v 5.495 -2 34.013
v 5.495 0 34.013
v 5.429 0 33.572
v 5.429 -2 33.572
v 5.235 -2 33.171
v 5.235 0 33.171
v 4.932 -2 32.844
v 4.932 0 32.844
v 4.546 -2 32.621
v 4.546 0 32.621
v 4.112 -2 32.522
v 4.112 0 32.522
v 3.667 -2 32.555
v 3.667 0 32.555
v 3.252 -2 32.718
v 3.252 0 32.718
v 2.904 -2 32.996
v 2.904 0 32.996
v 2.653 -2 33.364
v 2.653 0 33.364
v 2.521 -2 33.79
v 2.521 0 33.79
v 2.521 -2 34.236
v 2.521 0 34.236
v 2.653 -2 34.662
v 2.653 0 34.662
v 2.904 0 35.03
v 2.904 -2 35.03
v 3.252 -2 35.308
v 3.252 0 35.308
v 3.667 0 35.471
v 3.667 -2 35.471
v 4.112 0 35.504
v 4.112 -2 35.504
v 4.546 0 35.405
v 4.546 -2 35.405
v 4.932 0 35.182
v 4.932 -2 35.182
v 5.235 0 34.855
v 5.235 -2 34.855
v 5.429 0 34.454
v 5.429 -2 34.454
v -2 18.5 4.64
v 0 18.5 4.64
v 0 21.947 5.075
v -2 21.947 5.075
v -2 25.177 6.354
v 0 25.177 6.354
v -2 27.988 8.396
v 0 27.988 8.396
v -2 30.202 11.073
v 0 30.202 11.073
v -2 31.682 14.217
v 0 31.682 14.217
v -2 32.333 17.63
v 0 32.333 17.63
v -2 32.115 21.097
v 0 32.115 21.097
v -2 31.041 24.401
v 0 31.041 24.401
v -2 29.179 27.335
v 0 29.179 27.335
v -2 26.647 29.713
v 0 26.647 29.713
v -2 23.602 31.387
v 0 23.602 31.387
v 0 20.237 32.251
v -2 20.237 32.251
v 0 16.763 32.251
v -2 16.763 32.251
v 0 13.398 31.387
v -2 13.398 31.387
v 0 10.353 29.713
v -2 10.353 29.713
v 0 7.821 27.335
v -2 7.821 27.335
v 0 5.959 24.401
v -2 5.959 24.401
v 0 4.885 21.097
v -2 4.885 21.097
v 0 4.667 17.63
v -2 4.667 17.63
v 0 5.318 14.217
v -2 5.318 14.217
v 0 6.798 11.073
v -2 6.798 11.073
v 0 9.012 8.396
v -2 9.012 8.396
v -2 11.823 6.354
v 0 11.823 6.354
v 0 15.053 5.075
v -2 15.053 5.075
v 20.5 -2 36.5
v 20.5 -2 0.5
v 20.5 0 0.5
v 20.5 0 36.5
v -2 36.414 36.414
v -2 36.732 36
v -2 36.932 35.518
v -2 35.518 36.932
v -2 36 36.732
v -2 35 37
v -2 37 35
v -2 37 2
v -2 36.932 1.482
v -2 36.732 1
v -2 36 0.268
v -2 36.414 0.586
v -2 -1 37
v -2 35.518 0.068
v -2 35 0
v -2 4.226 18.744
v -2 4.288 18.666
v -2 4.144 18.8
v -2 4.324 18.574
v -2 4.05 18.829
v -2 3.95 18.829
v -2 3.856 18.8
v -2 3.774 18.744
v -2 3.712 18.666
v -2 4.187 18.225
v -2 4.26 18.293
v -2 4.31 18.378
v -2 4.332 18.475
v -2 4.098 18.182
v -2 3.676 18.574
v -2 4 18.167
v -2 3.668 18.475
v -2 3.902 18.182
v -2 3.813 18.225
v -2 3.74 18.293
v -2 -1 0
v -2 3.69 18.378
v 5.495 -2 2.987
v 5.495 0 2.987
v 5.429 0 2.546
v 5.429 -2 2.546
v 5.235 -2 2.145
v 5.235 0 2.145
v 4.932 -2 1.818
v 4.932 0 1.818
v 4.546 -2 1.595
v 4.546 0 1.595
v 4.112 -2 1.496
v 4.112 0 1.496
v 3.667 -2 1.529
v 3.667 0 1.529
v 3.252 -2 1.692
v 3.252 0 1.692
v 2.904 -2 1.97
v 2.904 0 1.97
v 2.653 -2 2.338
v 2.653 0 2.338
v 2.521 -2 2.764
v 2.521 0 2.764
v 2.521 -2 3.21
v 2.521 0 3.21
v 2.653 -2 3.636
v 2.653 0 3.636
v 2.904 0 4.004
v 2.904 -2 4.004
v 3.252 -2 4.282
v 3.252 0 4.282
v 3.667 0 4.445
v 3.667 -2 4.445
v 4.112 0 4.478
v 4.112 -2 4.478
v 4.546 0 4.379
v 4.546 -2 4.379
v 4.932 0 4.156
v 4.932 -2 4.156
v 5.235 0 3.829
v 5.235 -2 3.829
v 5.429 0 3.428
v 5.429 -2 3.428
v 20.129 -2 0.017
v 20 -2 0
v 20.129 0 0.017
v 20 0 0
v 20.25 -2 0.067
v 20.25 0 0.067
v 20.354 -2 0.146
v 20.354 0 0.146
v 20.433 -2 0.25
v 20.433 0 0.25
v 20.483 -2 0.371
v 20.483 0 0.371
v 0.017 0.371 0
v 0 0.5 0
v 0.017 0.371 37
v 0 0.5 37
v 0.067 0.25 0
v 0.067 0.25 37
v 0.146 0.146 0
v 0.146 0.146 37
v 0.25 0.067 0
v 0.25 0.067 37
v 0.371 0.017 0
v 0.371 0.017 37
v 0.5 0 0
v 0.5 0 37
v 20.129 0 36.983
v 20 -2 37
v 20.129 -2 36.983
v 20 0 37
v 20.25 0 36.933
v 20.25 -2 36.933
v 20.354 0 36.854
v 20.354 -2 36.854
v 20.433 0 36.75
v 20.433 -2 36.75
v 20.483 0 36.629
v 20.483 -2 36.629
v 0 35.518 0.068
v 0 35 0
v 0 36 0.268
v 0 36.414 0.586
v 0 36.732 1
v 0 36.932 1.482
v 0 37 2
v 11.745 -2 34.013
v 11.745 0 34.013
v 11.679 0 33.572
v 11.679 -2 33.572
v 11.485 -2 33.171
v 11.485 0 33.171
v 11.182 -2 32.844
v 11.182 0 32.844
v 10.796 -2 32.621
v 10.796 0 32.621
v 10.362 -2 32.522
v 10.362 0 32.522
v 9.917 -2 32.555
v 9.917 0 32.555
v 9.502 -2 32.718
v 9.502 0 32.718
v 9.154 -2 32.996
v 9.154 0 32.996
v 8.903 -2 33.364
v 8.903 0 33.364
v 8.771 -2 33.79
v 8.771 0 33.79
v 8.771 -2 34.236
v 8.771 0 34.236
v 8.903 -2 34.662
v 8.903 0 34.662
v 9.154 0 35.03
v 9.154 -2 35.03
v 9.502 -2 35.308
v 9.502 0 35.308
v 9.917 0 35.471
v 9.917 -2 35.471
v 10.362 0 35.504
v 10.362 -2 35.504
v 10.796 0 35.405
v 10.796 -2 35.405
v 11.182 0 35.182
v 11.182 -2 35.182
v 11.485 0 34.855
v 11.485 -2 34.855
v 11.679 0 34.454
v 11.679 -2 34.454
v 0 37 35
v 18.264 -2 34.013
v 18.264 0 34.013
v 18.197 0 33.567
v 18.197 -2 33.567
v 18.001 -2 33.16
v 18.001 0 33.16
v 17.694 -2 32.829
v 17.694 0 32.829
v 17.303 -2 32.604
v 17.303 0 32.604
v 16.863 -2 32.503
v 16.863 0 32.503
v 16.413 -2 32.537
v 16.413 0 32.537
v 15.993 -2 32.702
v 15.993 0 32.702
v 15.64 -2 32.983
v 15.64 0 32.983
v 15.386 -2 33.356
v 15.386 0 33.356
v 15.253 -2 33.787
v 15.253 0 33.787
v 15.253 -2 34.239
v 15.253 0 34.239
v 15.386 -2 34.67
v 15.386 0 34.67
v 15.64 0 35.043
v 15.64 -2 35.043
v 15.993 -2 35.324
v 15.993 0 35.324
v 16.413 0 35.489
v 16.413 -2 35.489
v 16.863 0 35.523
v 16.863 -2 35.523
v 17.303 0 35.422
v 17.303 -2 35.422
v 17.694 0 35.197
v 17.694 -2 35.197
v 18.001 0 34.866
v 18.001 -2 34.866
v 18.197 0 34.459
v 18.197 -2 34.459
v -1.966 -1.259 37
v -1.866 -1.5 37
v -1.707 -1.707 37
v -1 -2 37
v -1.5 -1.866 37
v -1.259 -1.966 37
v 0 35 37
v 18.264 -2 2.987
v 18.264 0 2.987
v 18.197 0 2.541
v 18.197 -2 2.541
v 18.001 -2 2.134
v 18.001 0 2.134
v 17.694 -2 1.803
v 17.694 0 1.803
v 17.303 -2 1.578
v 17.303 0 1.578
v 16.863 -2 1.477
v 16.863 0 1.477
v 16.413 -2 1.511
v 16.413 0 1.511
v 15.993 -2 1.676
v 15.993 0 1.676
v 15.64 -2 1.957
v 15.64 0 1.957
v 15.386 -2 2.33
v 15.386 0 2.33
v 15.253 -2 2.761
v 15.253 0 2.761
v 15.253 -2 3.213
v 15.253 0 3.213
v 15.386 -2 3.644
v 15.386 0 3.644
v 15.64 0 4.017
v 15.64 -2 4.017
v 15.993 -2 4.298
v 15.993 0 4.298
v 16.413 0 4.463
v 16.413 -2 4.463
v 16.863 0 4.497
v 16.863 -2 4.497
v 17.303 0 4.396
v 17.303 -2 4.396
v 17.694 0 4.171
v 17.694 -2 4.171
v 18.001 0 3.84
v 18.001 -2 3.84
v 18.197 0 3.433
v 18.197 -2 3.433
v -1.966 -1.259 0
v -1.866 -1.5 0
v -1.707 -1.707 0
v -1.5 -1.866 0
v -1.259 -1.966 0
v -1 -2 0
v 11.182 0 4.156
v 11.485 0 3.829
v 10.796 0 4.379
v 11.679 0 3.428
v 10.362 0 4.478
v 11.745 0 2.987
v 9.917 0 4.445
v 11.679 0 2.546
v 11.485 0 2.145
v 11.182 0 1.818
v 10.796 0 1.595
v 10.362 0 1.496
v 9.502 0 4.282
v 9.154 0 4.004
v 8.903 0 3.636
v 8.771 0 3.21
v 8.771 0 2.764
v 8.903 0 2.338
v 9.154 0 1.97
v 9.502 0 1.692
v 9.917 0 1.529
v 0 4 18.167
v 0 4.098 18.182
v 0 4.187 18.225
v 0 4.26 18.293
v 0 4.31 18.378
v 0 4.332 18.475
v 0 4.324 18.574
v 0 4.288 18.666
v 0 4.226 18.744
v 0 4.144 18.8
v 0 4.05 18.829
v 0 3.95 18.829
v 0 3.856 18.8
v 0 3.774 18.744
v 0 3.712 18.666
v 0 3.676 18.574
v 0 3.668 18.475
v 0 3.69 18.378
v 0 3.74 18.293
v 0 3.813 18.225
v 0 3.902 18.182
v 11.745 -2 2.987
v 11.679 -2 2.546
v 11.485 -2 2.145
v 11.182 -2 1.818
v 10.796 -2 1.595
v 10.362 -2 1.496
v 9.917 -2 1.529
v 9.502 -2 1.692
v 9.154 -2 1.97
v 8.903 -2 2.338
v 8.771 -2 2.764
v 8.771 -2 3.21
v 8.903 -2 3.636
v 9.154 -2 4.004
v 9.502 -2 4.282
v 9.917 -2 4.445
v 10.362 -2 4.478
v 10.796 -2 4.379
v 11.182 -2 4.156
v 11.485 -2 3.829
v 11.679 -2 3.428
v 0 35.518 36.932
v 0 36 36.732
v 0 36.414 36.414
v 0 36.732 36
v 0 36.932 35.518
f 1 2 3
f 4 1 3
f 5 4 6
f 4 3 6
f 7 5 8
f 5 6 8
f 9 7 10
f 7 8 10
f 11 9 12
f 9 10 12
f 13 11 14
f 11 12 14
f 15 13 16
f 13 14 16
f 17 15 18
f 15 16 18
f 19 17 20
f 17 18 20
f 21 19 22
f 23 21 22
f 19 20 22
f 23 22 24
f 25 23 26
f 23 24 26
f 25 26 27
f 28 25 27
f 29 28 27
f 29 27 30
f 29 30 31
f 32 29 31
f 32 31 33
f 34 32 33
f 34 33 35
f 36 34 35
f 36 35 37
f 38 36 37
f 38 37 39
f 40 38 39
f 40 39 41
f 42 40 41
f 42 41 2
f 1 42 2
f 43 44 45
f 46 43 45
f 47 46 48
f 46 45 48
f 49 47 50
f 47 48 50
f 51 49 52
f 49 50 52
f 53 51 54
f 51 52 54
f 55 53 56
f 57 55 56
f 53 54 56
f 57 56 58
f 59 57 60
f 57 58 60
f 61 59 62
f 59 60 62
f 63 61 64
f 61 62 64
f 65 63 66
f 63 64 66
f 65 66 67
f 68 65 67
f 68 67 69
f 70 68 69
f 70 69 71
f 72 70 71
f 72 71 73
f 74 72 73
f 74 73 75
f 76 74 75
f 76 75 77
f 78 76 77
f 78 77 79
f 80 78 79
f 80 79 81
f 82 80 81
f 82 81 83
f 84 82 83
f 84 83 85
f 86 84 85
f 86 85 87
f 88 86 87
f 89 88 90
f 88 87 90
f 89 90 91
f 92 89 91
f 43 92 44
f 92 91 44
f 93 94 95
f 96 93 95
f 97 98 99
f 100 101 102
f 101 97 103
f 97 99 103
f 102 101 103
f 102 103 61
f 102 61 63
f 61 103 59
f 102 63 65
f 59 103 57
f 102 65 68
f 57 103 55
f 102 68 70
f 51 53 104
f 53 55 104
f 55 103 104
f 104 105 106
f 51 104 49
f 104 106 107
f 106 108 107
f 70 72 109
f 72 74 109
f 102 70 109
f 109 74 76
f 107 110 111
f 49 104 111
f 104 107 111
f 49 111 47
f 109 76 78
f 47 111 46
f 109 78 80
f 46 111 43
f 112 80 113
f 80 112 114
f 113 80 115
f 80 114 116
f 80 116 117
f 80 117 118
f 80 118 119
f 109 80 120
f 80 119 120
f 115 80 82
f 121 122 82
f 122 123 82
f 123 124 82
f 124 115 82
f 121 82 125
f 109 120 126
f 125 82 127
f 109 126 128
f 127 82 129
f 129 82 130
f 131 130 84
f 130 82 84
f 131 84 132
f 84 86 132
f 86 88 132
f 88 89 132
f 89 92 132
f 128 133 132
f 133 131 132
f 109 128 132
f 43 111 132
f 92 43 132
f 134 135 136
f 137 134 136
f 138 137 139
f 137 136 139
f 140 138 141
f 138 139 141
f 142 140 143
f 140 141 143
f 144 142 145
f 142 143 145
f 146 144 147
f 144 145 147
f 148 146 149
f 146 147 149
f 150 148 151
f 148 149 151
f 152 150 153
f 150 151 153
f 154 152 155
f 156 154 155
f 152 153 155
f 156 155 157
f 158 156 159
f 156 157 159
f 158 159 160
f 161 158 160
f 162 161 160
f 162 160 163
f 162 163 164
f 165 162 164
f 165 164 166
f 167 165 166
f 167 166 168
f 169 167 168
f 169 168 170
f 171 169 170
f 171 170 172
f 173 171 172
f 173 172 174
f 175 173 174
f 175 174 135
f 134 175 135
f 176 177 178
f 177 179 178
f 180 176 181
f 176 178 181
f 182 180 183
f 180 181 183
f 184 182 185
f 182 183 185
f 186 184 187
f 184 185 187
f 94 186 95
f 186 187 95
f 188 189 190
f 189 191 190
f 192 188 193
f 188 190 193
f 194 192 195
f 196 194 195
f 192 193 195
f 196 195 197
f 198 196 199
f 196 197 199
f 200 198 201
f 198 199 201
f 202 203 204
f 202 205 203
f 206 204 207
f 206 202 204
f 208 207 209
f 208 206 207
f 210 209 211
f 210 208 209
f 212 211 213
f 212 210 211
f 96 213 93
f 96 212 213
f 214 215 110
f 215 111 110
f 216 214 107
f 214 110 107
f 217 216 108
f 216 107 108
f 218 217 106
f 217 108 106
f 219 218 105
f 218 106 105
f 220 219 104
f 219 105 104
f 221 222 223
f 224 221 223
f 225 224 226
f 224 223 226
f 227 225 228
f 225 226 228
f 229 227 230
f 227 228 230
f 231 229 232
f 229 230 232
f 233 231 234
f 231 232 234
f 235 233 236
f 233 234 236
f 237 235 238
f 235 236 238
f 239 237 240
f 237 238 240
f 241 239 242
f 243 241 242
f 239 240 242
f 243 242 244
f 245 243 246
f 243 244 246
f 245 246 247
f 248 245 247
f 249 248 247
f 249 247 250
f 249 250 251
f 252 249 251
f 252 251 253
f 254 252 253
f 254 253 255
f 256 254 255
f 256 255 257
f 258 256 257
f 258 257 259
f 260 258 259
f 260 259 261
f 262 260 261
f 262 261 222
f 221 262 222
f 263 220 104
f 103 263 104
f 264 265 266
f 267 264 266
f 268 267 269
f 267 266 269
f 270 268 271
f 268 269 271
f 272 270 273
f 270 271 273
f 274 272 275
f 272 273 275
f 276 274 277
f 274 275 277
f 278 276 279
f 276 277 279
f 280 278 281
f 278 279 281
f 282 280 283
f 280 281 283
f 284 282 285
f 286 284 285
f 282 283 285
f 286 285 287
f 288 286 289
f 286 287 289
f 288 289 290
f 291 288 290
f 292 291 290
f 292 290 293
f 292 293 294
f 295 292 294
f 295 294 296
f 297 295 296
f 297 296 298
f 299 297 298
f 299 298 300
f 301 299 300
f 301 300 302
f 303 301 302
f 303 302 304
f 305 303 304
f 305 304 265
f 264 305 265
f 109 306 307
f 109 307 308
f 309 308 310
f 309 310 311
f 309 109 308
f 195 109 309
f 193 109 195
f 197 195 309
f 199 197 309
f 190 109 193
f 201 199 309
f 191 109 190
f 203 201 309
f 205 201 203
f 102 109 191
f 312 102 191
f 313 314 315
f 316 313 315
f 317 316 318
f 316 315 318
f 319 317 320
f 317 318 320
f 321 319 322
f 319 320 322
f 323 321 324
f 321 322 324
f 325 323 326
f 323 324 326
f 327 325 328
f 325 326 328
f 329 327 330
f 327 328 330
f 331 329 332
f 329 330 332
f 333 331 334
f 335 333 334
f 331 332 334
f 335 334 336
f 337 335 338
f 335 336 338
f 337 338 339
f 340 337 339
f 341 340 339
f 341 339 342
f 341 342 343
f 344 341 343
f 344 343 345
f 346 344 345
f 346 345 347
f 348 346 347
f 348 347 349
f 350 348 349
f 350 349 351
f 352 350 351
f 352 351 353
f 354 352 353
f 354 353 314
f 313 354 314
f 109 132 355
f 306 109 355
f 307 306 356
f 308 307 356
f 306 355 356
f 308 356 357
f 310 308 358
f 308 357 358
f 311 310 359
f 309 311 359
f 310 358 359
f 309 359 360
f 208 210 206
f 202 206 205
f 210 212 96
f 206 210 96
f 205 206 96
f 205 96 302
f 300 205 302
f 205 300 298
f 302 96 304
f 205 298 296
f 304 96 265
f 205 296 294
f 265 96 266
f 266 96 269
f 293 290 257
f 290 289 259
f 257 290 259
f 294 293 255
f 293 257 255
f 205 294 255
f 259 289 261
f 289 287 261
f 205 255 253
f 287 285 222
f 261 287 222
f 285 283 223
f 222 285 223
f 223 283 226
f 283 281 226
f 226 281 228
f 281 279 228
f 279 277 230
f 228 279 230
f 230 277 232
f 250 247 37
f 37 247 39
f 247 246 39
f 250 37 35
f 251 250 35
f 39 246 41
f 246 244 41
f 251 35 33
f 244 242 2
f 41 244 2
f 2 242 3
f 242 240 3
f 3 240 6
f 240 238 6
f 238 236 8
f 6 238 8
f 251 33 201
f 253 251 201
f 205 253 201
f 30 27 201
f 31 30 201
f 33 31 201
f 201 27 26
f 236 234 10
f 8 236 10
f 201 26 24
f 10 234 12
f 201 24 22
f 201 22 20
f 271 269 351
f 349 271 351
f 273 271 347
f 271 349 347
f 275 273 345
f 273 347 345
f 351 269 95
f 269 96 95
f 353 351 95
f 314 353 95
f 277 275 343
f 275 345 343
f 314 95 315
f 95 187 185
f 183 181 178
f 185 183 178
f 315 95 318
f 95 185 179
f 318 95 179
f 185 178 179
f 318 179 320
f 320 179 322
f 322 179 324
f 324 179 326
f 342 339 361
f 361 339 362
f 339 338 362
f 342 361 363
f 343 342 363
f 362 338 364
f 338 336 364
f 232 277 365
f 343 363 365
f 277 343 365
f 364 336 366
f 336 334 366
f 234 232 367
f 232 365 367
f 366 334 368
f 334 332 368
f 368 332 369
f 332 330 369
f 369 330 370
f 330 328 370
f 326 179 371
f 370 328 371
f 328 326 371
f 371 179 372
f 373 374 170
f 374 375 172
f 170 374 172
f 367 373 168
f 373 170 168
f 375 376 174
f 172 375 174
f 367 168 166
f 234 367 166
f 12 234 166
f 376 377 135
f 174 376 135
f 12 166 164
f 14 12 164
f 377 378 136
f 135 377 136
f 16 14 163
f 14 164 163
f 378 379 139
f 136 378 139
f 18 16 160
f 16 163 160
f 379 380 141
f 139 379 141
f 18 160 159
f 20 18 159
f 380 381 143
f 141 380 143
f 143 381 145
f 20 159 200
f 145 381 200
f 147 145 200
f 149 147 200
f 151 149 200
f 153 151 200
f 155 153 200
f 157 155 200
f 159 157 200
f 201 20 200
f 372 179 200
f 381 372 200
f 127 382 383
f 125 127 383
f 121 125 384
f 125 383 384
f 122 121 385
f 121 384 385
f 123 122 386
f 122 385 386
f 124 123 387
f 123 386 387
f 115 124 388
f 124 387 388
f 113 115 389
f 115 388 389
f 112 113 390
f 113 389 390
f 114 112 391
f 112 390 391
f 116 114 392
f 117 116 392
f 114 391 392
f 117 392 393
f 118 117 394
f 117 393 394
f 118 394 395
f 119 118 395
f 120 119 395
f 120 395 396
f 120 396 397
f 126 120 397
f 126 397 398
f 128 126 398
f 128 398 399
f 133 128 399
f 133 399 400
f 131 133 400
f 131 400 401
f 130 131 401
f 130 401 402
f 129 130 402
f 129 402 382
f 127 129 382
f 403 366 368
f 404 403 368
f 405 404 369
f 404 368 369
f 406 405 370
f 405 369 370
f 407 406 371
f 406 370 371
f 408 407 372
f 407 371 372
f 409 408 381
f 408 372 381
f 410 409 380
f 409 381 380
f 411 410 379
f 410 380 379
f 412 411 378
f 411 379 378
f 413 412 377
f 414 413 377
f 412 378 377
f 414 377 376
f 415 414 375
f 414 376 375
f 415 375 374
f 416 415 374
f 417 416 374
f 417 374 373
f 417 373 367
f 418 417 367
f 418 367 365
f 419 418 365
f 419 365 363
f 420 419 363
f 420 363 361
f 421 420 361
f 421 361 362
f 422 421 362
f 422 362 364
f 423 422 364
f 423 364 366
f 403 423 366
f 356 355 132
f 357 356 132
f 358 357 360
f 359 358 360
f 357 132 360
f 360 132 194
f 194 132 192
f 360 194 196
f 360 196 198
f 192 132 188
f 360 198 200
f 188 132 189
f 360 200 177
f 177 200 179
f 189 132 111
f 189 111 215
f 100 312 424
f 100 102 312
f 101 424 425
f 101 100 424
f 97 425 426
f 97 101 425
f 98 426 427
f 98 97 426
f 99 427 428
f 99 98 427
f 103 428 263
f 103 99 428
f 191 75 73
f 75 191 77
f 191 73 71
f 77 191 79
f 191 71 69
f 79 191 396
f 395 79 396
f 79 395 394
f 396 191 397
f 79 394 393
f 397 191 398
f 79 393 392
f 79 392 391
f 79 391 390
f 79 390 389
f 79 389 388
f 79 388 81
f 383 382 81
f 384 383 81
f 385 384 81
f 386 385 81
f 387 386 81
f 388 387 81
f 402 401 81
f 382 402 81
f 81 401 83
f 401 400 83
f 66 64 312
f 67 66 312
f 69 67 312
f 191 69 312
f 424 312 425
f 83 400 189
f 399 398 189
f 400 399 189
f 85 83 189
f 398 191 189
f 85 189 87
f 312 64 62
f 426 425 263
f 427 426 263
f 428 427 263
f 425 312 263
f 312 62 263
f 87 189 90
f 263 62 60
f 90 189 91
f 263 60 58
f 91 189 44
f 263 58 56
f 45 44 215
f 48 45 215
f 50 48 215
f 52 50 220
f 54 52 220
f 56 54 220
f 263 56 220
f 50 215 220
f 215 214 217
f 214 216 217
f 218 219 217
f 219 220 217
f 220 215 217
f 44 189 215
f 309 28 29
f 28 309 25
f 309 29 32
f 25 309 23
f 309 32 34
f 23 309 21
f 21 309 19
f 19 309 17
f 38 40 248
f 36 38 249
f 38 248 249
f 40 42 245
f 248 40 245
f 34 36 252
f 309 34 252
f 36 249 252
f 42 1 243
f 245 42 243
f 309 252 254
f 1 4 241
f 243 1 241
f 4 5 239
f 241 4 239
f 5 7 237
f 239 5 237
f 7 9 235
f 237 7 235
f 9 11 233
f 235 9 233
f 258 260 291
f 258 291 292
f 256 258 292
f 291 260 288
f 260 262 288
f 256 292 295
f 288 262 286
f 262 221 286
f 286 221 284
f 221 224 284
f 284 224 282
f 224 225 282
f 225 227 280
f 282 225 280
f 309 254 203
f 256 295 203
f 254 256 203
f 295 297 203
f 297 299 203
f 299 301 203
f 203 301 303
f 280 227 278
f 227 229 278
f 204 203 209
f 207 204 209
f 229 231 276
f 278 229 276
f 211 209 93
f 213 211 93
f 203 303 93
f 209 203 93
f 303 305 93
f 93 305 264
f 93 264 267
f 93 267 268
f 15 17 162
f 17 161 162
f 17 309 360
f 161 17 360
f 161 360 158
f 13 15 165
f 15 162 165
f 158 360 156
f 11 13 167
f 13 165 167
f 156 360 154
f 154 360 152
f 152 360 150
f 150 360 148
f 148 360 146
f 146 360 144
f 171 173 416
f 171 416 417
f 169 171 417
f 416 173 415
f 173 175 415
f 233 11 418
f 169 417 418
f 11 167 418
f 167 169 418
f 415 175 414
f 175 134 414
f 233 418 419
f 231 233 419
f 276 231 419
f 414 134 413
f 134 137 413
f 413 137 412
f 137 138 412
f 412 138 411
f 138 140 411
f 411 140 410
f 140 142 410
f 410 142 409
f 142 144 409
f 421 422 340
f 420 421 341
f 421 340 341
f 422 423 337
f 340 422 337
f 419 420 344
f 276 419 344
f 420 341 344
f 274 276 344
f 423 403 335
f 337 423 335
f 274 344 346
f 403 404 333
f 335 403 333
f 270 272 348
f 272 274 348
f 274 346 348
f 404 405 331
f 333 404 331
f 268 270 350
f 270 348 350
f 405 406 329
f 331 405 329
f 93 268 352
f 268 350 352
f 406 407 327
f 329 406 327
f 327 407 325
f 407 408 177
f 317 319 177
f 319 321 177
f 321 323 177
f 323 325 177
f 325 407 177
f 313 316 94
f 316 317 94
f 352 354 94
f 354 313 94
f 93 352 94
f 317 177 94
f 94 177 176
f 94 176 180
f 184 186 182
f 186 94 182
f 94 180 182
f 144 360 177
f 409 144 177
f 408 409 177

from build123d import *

# Parameters (mm, degrees)
BOSS_EXTRUDE1_DEPTH = 37
SKETCH2_R           = 13.860055969
SKETCH2_R_2         = 0.332739378
CUT_EXTRUDE1_DEPTH  = 10
SKETCH3_R           = 1.513801081
SKETCH3_R_2         = 1.495226131
CUT_EXTRUDE2_DEPTH  = 10
FILLET1_R           = 2
FILLET2_R           = 0.5
FILLET3_R           = 0.5


with BuildPart() as part:
    # Sketch1 → Boss-Extrude1 (new body)
    with BuildSketch(Plane.XY):
        with BuildLine():
            Line((0, 0), (0, 37))
            Line((0, 37), (-2, 37))
            Line((-2, 37), (-2, -1))
            ThreePointArc((-2, -1), (-1.707106781, -1.707106781), (-1, -2))
            Line((-1, -2), (20.5, -2))
            Line((20.5, -2), (20.5, 0))
            Line((20.5, 0), (0, 0))
        make_face()
    extrude(amount=BOSS_EXTRUDE1_DEPTH)

    # Sketch2 → Cut-Extrude1 (cut)
    with BuildSketch(Plane(origin=(0, 0, 0), x_dir=(0, 0, -1), z_dir=(1, 0, 0))):
        with Locations((-18.5, 18.5)):
            Circle(SKETCH2_R)
        with Locations((-18.5, 4)):
            Circle(SKETCH2_R_2)
    extrude(amount=-CUT_EXTRUDE1_DEPTH, mode=Mode.SUBTRACT)

    # Sketch3 → Cut-Extrude2 (cut)
    with BuildSketch(Plane(origin=(0, 0, 0), x_dir=(1, 0, 0), z_dir=(0, 1, 0))):
        with Locations((16.75, -2.987028894)):
            Circle(SKETCH3_R)
        with Locations((10.25, -2.987028894)):
            Circle(SKETCH3_R_2)
        with Locations((4, -2.987028894)):
            Circle(SKETCH3_R_2)
        with Locations((16.75, -34.012971106)):
            Circle(SKETCH3_R)
        with Locations((10.25, -34.012971106)):
            Circle(SKETCH3_R_2)
        with Locations((4, -34.012971106)):
            Circle(SKETCH3_R_2)
    extrude(amount=-CUT_EXTRUDE2_DEPTH, mode=Mode.SUBTRACT)

    # Fillet1
    fillet1_edges = [part.edges().sort_by_distance(p)[0] for p in [
        (-1, 37, 37),
        (-1, 37, 0),
    ]]
    fillet(fillet1_edges, radius=FILLET1_R)

    # Fillet2
    fillet2_edges = [part.edges().sort_by_distance(p)[0] for p in [
        (0, 0, 18.5),
    ]]
    fillet(fillet2_edges, radius=FILLET2_R)

    # Fillet3
    fillet3_edges = [part.edges().sort_by_distance(p)[0] for p in [
        (20.5, -1, 37),
        (20.5, -1, 0),
    ]]
    fillet(fillet3_edges, radius=FILLET3_R)


solid = part.part
